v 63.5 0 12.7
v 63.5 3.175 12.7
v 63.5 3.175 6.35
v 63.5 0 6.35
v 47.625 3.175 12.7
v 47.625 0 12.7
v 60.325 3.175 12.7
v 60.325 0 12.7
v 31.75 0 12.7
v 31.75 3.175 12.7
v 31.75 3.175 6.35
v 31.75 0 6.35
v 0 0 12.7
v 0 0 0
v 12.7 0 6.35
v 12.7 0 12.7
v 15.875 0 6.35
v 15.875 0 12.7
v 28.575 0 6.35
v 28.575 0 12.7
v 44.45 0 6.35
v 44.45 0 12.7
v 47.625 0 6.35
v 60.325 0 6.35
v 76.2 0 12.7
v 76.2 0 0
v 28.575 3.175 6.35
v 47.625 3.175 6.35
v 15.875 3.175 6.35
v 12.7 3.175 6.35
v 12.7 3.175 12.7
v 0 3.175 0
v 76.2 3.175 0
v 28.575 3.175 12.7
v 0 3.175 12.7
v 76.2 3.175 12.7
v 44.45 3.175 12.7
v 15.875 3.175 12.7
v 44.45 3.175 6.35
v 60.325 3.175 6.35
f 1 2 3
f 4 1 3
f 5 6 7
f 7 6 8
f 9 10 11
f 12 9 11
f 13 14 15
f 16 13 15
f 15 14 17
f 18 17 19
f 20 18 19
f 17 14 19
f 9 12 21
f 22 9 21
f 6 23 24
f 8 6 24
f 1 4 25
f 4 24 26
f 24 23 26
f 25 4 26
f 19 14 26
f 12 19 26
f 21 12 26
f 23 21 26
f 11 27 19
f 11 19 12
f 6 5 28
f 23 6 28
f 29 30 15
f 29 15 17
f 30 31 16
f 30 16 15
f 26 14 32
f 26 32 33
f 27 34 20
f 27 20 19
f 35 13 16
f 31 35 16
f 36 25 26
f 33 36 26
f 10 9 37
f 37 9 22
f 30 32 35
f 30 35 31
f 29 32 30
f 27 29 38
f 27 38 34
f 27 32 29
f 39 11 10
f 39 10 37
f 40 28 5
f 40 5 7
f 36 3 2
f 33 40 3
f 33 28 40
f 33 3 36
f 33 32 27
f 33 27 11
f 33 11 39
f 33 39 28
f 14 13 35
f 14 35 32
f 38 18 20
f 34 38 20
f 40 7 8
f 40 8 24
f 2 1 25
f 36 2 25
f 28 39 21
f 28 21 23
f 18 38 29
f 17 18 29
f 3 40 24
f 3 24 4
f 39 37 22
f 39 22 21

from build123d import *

# Parameters (mm, degrees)
SKETCH1_W           = 76.2
SKETCH1_H           = 12.7
BOSS_EXTRUDE1_DEPTH = 3.175
SKETCH4_W           = 3.175
SKETCH4_H           = 6.35
CUT_EXTRUDE1_DEPTH  = 4.175
LPATTERN1_COUNT     = 4
LPATTERN1_PITCH     = 15.875


with BuildPart() as part:
    # Sketch1 → Boss-Extrude1 (new body)
    with BuildSketch(Plane(origin=(0, 0, 0), x_dir=(1, 0, 0), z_dir=(0, 1, 0))):
        with Locations((38.1, -6.35)):
            Rectangle(SKETCH1_W, SKETCH1_H)
    extrude(amount=BOSS_EXTRUDE1_DEPTH)

    # Sketch4 → Cut-Extrude1 (cut, through all)
    with BuildSketch(Plane(origin=(0, 3.175, 0), x_dir=(1, 0, 0), z_dir=(0, 1, 0))):
        with Locations((14.2875, -9.525)):
            Rectangle(SKETCH4_W, SKETCH4_H)
    cut_extrude1 = extrude(amount=-CUT_EXTRUDE1_DEPTH, mode=Mode.SUBTRACT)

    # LPattern1: Cut-Extrude1 ×4
    with Locations(*[(i * LPATTERN1_PITCH, 0, 0) for i in range(1, LPATTERN1_COUNT)]):
        add(cut_extrude1, mode=Mode.SUBTRACT)


solid = part.part
